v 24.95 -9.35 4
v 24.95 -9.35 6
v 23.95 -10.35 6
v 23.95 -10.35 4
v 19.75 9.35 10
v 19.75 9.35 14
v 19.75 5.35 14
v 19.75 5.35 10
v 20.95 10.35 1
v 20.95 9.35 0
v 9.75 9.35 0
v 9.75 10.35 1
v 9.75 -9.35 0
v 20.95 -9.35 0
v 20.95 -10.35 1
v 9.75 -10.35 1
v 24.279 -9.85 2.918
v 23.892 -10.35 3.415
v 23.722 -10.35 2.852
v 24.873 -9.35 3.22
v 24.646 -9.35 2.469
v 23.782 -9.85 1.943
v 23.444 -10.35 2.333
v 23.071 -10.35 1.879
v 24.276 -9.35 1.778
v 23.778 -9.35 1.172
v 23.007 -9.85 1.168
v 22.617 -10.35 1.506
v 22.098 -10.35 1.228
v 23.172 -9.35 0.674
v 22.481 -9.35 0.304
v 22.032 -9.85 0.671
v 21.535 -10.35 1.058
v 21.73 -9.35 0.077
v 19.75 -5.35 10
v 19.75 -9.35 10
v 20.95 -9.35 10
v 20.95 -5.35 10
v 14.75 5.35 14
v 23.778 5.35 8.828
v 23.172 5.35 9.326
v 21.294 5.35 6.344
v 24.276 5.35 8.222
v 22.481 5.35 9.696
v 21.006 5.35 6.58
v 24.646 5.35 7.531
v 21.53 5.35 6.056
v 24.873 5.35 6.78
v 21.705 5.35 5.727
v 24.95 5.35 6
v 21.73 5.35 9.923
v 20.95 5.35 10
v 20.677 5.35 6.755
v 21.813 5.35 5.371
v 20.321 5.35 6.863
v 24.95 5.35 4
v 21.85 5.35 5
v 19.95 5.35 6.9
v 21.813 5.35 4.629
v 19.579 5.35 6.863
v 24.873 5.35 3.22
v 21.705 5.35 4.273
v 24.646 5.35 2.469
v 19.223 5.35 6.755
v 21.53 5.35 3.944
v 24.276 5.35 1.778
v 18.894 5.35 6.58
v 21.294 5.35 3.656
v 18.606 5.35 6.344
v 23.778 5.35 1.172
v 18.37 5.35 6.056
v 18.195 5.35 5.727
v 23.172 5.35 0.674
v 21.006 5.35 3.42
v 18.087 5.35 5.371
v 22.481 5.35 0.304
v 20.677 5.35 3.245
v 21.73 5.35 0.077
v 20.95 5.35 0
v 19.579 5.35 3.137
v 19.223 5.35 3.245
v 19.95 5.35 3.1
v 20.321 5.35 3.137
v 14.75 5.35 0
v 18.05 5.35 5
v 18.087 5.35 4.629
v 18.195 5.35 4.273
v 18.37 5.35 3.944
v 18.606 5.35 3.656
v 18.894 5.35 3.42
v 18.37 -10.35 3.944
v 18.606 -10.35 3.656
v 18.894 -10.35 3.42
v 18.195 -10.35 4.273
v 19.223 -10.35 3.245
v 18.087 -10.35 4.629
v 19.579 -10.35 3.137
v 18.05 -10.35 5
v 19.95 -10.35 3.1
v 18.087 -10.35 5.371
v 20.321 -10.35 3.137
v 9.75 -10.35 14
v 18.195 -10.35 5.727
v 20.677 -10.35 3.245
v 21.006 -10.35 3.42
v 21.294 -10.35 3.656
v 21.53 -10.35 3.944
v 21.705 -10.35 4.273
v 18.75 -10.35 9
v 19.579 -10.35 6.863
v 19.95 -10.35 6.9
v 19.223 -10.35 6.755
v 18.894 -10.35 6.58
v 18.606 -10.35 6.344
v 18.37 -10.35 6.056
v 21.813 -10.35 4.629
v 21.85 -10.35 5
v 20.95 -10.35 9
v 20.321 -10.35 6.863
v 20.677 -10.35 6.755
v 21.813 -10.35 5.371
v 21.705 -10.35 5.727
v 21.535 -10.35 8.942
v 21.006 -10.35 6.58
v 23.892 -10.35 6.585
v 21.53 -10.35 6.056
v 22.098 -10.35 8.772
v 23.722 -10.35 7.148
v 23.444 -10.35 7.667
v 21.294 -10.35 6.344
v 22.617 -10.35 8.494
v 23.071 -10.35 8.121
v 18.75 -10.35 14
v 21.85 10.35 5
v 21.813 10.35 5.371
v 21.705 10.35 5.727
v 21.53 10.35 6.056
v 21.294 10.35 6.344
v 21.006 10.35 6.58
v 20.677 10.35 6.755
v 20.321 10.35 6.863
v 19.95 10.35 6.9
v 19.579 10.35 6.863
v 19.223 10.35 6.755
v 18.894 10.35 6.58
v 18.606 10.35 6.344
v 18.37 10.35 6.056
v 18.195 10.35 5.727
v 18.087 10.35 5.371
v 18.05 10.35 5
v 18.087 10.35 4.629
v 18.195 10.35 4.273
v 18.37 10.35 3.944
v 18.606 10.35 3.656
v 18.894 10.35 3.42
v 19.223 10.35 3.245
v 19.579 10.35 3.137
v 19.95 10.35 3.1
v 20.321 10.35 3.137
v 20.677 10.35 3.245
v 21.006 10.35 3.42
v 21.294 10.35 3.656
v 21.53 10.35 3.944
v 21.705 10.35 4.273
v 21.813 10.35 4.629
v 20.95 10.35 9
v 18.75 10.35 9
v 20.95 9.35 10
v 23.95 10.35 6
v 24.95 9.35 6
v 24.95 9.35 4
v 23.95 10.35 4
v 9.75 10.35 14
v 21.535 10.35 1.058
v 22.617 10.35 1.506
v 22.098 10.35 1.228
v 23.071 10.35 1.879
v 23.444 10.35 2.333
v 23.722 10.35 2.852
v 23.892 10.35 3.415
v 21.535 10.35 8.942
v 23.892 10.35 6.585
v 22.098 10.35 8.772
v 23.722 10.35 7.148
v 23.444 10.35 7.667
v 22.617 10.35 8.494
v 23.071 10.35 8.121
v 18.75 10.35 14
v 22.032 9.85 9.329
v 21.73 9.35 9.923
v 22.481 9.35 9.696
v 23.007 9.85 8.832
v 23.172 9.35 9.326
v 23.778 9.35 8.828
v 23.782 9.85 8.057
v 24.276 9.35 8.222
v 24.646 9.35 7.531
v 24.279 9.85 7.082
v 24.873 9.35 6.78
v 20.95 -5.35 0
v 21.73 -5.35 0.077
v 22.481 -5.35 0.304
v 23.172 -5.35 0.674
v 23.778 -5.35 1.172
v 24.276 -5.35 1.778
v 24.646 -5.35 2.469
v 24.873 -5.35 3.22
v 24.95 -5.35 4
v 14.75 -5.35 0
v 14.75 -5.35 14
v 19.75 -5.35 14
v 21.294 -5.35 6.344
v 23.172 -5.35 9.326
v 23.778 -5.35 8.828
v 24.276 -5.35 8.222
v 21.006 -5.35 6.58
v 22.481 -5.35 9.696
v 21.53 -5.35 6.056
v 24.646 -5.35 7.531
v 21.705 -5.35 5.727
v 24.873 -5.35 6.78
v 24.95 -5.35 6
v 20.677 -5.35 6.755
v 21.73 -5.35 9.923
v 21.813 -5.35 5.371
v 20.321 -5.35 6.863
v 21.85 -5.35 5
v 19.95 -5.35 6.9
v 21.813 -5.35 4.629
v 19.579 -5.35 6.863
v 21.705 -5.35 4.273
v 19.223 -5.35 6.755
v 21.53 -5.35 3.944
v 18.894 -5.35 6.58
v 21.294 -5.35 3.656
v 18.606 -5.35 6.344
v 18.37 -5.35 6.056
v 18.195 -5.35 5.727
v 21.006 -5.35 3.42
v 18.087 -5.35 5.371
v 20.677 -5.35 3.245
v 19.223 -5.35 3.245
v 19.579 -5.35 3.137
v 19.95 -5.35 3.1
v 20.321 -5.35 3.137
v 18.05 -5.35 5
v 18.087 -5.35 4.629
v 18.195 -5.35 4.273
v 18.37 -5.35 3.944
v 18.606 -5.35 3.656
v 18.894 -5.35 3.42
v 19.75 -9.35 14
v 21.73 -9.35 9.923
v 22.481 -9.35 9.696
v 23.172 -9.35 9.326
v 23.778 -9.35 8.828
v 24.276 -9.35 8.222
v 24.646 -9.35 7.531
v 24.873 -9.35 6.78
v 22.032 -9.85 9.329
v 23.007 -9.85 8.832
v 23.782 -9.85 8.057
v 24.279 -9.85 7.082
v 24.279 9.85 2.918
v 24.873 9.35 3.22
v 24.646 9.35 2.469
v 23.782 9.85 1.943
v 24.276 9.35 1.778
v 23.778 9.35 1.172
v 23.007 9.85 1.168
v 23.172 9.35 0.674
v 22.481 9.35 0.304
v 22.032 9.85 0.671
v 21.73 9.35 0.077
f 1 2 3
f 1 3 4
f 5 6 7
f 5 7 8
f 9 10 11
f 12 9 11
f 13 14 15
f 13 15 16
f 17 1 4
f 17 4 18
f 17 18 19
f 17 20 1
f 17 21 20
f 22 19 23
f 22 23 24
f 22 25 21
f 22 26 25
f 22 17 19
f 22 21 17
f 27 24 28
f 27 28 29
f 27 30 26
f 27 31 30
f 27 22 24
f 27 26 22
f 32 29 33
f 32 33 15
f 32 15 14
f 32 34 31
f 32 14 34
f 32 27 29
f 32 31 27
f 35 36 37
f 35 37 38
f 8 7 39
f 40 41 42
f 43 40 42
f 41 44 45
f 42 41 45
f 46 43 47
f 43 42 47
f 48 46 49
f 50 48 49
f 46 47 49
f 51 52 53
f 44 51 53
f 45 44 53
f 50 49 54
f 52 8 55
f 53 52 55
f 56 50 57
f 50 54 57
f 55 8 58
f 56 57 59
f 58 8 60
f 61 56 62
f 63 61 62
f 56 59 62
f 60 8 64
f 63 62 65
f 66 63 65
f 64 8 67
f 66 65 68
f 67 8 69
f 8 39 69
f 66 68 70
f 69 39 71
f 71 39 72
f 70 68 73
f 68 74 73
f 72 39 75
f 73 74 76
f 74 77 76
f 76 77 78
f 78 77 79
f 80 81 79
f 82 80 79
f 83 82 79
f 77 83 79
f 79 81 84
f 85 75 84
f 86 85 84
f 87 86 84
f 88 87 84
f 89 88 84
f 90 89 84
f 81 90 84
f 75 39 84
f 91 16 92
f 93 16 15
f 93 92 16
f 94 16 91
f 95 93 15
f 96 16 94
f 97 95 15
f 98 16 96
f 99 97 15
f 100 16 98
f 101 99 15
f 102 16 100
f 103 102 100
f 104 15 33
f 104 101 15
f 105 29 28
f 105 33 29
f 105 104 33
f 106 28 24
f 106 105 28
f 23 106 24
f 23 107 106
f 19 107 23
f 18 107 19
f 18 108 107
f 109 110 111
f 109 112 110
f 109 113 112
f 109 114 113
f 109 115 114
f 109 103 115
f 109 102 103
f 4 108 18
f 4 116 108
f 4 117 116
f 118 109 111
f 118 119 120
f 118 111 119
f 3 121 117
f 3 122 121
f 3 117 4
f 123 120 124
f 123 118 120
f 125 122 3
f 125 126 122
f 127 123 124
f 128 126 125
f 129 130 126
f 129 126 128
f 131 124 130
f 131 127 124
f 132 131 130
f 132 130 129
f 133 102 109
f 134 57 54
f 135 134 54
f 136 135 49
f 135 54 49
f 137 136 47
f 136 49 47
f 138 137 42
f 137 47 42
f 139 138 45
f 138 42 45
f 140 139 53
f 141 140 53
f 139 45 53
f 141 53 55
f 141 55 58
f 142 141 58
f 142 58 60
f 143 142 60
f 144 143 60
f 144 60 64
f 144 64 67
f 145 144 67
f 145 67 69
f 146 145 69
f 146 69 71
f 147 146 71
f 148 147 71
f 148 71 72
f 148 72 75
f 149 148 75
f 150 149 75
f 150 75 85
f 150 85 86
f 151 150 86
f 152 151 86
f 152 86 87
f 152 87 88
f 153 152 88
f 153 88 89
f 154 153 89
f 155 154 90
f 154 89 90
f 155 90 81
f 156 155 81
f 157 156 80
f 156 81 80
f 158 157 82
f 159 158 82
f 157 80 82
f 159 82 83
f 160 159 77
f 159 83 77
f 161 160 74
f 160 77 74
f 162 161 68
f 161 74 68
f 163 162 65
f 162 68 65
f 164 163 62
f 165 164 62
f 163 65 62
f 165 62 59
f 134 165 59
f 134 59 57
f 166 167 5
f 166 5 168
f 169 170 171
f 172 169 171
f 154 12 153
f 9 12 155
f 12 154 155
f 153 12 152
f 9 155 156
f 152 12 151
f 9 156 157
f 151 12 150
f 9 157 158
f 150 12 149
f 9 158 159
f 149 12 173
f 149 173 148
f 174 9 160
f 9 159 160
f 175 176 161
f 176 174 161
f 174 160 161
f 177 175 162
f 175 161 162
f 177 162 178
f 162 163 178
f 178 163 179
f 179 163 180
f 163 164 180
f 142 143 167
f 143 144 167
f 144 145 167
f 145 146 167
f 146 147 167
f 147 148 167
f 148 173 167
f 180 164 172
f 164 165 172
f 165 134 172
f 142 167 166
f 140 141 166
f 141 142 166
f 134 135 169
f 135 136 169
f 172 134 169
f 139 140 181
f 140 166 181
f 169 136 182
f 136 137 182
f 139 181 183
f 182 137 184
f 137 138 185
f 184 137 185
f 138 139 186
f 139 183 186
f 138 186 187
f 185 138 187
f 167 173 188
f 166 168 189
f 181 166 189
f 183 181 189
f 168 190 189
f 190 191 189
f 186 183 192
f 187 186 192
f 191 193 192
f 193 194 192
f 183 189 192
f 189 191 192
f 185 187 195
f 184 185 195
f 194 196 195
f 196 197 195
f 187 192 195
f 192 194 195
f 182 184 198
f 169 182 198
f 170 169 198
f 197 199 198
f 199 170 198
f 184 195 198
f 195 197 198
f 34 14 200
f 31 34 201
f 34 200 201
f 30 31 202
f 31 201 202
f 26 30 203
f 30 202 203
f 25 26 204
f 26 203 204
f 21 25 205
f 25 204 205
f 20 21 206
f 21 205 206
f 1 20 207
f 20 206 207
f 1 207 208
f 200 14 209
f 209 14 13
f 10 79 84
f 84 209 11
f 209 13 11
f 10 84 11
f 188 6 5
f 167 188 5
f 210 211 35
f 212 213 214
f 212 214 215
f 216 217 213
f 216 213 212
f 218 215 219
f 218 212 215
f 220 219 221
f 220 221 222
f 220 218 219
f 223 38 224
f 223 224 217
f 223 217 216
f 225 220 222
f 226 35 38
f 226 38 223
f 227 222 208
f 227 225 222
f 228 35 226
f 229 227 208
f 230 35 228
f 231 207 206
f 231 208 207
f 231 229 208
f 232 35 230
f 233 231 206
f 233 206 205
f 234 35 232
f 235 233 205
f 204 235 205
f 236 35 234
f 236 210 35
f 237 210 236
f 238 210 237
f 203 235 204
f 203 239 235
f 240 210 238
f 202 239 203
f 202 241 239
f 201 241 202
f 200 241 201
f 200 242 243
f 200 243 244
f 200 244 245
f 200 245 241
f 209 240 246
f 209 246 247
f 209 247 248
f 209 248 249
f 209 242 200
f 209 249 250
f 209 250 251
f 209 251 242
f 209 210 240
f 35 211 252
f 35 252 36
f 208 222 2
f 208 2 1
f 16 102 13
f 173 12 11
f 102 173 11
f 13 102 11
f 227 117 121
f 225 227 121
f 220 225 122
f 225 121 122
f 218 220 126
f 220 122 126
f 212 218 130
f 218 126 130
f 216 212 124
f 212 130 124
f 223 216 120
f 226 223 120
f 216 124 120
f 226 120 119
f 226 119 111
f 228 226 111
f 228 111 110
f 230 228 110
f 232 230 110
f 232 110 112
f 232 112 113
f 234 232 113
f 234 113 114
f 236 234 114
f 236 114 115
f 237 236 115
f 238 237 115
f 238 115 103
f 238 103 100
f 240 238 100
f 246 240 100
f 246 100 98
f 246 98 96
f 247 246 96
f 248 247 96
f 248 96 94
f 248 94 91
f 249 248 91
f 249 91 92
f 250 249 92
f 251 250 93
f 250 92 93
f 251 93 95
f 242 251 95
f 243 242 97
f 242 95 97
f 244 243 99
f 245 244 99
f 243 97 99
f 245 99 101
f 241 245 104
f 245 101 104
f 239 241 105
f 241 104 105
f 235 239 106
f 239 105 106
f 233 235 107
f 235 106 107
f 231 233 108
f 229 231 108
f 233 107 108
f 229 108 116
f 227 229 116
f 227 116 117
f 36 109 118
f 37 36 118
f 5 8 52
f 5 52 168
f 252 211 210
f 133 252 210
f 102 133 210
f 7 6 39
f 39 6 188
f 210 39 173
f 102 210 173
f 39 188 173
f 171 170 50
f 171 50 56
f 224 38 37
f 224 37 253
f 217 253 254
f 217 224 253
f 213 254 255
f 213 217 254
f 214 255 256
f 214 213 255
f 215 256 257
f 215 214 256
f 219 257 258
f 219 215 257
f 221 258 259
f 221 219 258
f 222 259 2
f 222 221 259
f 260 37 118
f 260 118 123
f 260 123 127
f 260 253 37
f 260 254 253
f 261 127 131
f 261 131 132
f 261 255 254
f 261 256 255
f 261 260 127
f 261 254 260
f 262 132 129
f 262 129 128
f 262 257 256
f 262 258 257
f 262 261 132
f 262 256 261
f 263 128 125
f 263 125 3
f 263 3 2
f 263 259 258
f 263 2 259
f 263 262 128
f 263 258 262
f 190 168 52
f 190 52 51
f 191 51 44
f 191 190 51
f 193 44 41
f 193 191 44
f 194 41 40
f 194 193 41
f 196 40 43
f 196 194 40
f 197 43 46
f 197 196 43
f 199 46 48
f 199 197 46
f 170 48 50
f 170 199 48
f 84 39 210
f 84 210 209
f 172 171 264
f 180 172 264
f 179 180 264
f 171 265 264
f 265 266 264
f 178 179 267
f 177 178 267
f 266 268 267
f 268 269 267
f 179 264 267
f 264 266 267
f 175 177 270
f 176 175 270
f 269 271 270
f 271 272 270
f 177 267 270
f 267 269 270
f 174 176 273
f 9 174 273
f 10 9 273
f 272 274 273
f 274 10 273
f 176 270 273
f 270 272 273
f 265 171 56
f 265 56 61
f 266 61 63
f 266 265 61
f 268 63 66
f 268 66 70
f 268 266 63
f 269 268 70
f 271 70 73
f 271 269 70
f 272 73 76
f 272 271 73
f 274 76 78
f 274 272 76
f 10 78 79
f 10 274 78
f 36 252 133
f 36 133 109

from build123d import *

# Parameters (mm, degrees)
SKETCH_1_R               = 6.25
EXTRUDE_1_DEPTH          = 15
SKETCH_2_W               = 29.5
SKETCH_2_H               = 20.7
EXTRUDE_2_DEPTH          = 5
SKETCH_3_W               = 39
SKETCH_3_H               = 20.7
SKETCH_3_R               = 1.6
EXTRUDE_3_DEPTH          = 5
SKETCH_4_W               = 10
SKETCH_4_H               = 5
EXTRUDE_4_DEPTH          = 10.2
SKETCH_5_R               = 1.9
CUT_EXTRUDE_1_DEPTH      = 21.7
FILLET_1_R               = 4
SKETCH_8_W               = 24
SKETCH_8_H               = 5
EXTRUDE_6_DEPTH          = 5
SKETCH_9_R               = 1.6
EXTRUDE_7_DEPTH          = 5
EXTRUDE_5_DEPTH          = 3
CHAMFER_1_SIZE           = 1
CHAMFER_2_SIZE           = 1
SKETCH_10_W              = 6.3
SKETCH_10_H              = 5.8
CUT_EXTRUDE_2_DEPTH      = 2.5
SKETCH_11_R              = 1.65
CUT_EXTRUDE_3_DEPTH      = 25.95
CUT_EXTRUDE_3_DEPTH_BACK = 15.75
CUT_EXTRUDE_4_DEPTH      = 1
CUT_EXTRUDE_4_DEPTH_BACK = 21.7


with BuildPart() as part:
    # ｽｹｯﾁ1 → ﾎﾞｽ - 押し出し1 (new body)
    with BuildSketch(Plane.XY):
        Circle(SKETCH_1_R)
    extrude(amount=-EXTRUDE_1_DEPTH)

    # ｽｹｯﾁ2 → ﾎﾞｽ - 押し出し2 (add)
    with BuildSketch(Plane.XY):
        Rectangle(SKETCH_2_W, SKETCH_2_H)
    extrude(amount=EXTRUDE_2_DEPTH)

    # ｽｹｯﾁ3 → ﾎﾞｽ - 押し出し3 (add)
    with BuildSketch(Plane(origin=(14.75, 0, 0), x_dir=(0, 0, -1), z_dir=(1, 0, 0))):
        with Locations((-24.5, 0)):
            Rectangle(SKETCH_3_W, SKETCH_3_H)
        with Locations((-20, 0)):
            Circle(SKETCH_3_R, mode=Mode.SUBTRACT)
    extrude(amount=-EXTRUDE_3_DEPTH)

    # ｽｹｯﾁ4 → ﾎﾞｽ - 押し出し4 (add)
    with BuildSketch(Plane(origin=(14.75, 0, 0), x_dir=(0, 0, -1), z_dir=(1, 0, 0))):
        with Locations((-5, 7.85)):
            Rectangle(SKETCH_4_W, SKETCH_4_H)
        with Locations((-5, -7.85)):
            Rectangle(SKETCH_4_W, SKETCH_4_H)
        with Locations((-39, 7.85)):
            Rectangle(SKETCH_4_W, SKETCH_4_H)
        with Locations((-39, -7.85)):
            Rectangle(SKETCH_4_W, SKETCH_4_H)
    extrude(amount=EXTRUDE_4_DEPTH)

    # ｽｹｯﾁ5 → ｶｯﾄ - 押し出し1 (cut, through all)
    with BuildSketch(Plane.XZ.offset(10.35)):
        with Locations((19.95, 5)):
            Circle(SKETCH_5_R)
        with Locations((19.95, 39)):
            Circle(SKETCH_5_R)
    extrude(amount=-CUT_EXTRUDE_1_DEPTH, mode=Mode.SUBTRACT)

    # ﾌｨﾚｯﾄ1
    fillet_1_edges = [part.edges().sort_by_distance(p)[0] for p in [
        (24.95, 7.85, 0),
        (24.95, 7.85, 10),
        (24.95, -7.85, 0),
        (24.95, -7.85, 10),
        (24.95, -7.85, 44),
        (24.95, -7.85, 34),
        (24.95, 7.85, 44),
        (24.95, 7.85, 34),
    ]]
    fillet(fillet_1_edges, radius=FILLET_1_R)

    # ｽｹｯﾁ8 → ﾎﾞｽ - 押し出し6 (add)
    with BuildSketch(Plane(origin=(14.75, 0, 0), x_dir=(0, 0, -1), z_dir=(1, 0, 0))):
        with Locations((-22, 7.85)):
            Rectangle(SKETCH_8_W, SKETCH_8_H)
        with Locations((-22, -7.85)):
            Rectangle(SKETCH_8_W, SKETCH_8_H)
    extrude(amount=EXTRUDE_6_DEPTH)

    # ｽｹｯﾁ9 → ﾎﾞｽ - 押し出し7 (add)
    with BuildSketch(Plane.ZY.offset(14.75)):
        with BuildLine():
            Line((5, 10.35), (11, 10.35))
            Line((11, 10.35), (22.121751649, 3.390895153))
            ThreePointArc((22.121751649, 3.390895153), (24, 0), (22.121751649, -3.390895153))
            Line((22.121751649, -3.390895153), (11, -10.35))
            Line((11, -10.35), (5, -10.35))
            Line((5, -10.35), (5, 10.35))
        make_face()
        with Locations((20, 0)):
            Circle(SKETCH_9_R, mode=Mode.SUBTRACT)
    extrude(amount=-EXTRUDE_7_DEPTH)

    # ｽｹｯﾁ6 → ﾎﾞｽ - 押し出し5 (add)
    with BuildSketch(Plane.XZ.offset(10.35)):
        Polygon((-9.75, 5), (9.75, 5), (9.75, 15), (-2.374355653, 8), (-9.75, 8), align=None)
    extrude_5 = extrude(amount=-EXTRUDE_5_DEPTH)

    # ﾐﾗｰ1: ﾎﾞｽ - 押し出し5 across plane
    add(extrude_5.mirror(Plane.ZX))

    # 面取り1
    chamfer_1_edges = [part.edges().sort_by_distance(p)[0] for p in [
        (20.35, -10.35, 34),
        (24.95, -10.35, 5),
        (20.35, -10.35, 10),
        (23.778427125, -10.35, 8.828427125),
        (23.778427125, -10.35, 1.171572875),
        (23.778427125, -10.35, 42.828427125),
        (23.778427125, -10.35, 35.171572875),
        (24.95, 10.35, 39),
        (3.1, 10.35, 0),
        (20.35, 10.35, 34),
        (20.35, 10.35, 10),
        (24.95, 10.35, 5),
        (23.778427125, 10.35, 1.171572875),
        (23.778427125, 10.35, 8.828427125),
        (23.778427125, 10.35, 42.828427125),
        (23.778427125, 10.35, 35.171572875),
        (19.75, 10.35, 22),
        (19.75, -10.35, 22),
        (9.75, -10.35, 29.5),
        (9.75, 0, 44),
        (15.35, -10.35, 44),
        (15.35, 10.35, 44),
        (9.75, 10.35, 29.5),
        (-14.75, 0, 0),
        (-14.75, 10.35, 5.5),
        (3.1, -10.35, 0),
        (-14.75, -10.35, 5.5),
        (24.95, -10.35, 39),
    ]]
    chamfer(chamfer_1_edges, length=CHAMFER_1_SIZE)

    # 面取り2
    chamfer_2_edges = [part.edges().sort_by_distance(p)[0] for p in [
        (-9.75, -8.85, 8),
        (-9.75, 8.85, 8),
    ]]
    chamfer(chamfer_2_edges, length=CHAMFER_2_SIZE)

    # ｽｹｯﾁ10 → ｶｯﾄ - 押し出し2 (cut)
    with BuildSketch(Plane(origin=(14.75, 0, 0), x_dir=(0, 0, -1), z_dir=(1, 0, 0))):
        with Locations((-20, 0)):
            Rectangle(SKETCH_10_W, SKETCH_10_H)
    extrude(amount=-CUT_EXTRUDE_2_DEPTH, mode=Mode.SUBTRACT)

    # ｽｹｯﾁ11 → ｶｯﾄ - 押し出し3 (cut, two sides)
    with BuildSketch(Plane(origin=(0, 0, 0), x_dir=(0, 0, -1), z_dir=(1, 0, 0))) as cut_extrude_3_sk:
        with Locations((7.5, 0)):
            Circle(SKETCH_11_R)
    extrude(amount=CUT_EXTRUDE_3_DEPTH, mode=Mode.SUBTRACT)
    extrude(cut_extrude_3_sk.sketch, amount=-CUT_EXTRUDE_3_DEPTH_BACK, mode=Mode.SUBTRACT)

    # ｽｹｯﾁ12 → ｶｯﾄ - 押し出し4 (cut, two sides)
    with BuildSketch(Plane(origin=(0, 10.35, 0), x_dir=(1, 0, 0), z_dir=(0, 1, 0))) as cut_extrude_4_sk:
        Polygon((147.57222826, -14), (29.932862948, -14), (9.75, -14), (9.75, 2.815371833), (9.75, 120.454737145), (-154.547009772, -47.957179489), (-16.724781512, -182.411916634), align=None)
    extrude(amount=CUT_EXTRUDE_4_DEPTH, mode=Mode.SUBTRACT)
    extrude(cut_extrude_4_sk.sketch, amount=-CUT_EXTRUDE_4_DEPTH_BACK, mode=Mode.SUBTRACT)


solid = part.part
